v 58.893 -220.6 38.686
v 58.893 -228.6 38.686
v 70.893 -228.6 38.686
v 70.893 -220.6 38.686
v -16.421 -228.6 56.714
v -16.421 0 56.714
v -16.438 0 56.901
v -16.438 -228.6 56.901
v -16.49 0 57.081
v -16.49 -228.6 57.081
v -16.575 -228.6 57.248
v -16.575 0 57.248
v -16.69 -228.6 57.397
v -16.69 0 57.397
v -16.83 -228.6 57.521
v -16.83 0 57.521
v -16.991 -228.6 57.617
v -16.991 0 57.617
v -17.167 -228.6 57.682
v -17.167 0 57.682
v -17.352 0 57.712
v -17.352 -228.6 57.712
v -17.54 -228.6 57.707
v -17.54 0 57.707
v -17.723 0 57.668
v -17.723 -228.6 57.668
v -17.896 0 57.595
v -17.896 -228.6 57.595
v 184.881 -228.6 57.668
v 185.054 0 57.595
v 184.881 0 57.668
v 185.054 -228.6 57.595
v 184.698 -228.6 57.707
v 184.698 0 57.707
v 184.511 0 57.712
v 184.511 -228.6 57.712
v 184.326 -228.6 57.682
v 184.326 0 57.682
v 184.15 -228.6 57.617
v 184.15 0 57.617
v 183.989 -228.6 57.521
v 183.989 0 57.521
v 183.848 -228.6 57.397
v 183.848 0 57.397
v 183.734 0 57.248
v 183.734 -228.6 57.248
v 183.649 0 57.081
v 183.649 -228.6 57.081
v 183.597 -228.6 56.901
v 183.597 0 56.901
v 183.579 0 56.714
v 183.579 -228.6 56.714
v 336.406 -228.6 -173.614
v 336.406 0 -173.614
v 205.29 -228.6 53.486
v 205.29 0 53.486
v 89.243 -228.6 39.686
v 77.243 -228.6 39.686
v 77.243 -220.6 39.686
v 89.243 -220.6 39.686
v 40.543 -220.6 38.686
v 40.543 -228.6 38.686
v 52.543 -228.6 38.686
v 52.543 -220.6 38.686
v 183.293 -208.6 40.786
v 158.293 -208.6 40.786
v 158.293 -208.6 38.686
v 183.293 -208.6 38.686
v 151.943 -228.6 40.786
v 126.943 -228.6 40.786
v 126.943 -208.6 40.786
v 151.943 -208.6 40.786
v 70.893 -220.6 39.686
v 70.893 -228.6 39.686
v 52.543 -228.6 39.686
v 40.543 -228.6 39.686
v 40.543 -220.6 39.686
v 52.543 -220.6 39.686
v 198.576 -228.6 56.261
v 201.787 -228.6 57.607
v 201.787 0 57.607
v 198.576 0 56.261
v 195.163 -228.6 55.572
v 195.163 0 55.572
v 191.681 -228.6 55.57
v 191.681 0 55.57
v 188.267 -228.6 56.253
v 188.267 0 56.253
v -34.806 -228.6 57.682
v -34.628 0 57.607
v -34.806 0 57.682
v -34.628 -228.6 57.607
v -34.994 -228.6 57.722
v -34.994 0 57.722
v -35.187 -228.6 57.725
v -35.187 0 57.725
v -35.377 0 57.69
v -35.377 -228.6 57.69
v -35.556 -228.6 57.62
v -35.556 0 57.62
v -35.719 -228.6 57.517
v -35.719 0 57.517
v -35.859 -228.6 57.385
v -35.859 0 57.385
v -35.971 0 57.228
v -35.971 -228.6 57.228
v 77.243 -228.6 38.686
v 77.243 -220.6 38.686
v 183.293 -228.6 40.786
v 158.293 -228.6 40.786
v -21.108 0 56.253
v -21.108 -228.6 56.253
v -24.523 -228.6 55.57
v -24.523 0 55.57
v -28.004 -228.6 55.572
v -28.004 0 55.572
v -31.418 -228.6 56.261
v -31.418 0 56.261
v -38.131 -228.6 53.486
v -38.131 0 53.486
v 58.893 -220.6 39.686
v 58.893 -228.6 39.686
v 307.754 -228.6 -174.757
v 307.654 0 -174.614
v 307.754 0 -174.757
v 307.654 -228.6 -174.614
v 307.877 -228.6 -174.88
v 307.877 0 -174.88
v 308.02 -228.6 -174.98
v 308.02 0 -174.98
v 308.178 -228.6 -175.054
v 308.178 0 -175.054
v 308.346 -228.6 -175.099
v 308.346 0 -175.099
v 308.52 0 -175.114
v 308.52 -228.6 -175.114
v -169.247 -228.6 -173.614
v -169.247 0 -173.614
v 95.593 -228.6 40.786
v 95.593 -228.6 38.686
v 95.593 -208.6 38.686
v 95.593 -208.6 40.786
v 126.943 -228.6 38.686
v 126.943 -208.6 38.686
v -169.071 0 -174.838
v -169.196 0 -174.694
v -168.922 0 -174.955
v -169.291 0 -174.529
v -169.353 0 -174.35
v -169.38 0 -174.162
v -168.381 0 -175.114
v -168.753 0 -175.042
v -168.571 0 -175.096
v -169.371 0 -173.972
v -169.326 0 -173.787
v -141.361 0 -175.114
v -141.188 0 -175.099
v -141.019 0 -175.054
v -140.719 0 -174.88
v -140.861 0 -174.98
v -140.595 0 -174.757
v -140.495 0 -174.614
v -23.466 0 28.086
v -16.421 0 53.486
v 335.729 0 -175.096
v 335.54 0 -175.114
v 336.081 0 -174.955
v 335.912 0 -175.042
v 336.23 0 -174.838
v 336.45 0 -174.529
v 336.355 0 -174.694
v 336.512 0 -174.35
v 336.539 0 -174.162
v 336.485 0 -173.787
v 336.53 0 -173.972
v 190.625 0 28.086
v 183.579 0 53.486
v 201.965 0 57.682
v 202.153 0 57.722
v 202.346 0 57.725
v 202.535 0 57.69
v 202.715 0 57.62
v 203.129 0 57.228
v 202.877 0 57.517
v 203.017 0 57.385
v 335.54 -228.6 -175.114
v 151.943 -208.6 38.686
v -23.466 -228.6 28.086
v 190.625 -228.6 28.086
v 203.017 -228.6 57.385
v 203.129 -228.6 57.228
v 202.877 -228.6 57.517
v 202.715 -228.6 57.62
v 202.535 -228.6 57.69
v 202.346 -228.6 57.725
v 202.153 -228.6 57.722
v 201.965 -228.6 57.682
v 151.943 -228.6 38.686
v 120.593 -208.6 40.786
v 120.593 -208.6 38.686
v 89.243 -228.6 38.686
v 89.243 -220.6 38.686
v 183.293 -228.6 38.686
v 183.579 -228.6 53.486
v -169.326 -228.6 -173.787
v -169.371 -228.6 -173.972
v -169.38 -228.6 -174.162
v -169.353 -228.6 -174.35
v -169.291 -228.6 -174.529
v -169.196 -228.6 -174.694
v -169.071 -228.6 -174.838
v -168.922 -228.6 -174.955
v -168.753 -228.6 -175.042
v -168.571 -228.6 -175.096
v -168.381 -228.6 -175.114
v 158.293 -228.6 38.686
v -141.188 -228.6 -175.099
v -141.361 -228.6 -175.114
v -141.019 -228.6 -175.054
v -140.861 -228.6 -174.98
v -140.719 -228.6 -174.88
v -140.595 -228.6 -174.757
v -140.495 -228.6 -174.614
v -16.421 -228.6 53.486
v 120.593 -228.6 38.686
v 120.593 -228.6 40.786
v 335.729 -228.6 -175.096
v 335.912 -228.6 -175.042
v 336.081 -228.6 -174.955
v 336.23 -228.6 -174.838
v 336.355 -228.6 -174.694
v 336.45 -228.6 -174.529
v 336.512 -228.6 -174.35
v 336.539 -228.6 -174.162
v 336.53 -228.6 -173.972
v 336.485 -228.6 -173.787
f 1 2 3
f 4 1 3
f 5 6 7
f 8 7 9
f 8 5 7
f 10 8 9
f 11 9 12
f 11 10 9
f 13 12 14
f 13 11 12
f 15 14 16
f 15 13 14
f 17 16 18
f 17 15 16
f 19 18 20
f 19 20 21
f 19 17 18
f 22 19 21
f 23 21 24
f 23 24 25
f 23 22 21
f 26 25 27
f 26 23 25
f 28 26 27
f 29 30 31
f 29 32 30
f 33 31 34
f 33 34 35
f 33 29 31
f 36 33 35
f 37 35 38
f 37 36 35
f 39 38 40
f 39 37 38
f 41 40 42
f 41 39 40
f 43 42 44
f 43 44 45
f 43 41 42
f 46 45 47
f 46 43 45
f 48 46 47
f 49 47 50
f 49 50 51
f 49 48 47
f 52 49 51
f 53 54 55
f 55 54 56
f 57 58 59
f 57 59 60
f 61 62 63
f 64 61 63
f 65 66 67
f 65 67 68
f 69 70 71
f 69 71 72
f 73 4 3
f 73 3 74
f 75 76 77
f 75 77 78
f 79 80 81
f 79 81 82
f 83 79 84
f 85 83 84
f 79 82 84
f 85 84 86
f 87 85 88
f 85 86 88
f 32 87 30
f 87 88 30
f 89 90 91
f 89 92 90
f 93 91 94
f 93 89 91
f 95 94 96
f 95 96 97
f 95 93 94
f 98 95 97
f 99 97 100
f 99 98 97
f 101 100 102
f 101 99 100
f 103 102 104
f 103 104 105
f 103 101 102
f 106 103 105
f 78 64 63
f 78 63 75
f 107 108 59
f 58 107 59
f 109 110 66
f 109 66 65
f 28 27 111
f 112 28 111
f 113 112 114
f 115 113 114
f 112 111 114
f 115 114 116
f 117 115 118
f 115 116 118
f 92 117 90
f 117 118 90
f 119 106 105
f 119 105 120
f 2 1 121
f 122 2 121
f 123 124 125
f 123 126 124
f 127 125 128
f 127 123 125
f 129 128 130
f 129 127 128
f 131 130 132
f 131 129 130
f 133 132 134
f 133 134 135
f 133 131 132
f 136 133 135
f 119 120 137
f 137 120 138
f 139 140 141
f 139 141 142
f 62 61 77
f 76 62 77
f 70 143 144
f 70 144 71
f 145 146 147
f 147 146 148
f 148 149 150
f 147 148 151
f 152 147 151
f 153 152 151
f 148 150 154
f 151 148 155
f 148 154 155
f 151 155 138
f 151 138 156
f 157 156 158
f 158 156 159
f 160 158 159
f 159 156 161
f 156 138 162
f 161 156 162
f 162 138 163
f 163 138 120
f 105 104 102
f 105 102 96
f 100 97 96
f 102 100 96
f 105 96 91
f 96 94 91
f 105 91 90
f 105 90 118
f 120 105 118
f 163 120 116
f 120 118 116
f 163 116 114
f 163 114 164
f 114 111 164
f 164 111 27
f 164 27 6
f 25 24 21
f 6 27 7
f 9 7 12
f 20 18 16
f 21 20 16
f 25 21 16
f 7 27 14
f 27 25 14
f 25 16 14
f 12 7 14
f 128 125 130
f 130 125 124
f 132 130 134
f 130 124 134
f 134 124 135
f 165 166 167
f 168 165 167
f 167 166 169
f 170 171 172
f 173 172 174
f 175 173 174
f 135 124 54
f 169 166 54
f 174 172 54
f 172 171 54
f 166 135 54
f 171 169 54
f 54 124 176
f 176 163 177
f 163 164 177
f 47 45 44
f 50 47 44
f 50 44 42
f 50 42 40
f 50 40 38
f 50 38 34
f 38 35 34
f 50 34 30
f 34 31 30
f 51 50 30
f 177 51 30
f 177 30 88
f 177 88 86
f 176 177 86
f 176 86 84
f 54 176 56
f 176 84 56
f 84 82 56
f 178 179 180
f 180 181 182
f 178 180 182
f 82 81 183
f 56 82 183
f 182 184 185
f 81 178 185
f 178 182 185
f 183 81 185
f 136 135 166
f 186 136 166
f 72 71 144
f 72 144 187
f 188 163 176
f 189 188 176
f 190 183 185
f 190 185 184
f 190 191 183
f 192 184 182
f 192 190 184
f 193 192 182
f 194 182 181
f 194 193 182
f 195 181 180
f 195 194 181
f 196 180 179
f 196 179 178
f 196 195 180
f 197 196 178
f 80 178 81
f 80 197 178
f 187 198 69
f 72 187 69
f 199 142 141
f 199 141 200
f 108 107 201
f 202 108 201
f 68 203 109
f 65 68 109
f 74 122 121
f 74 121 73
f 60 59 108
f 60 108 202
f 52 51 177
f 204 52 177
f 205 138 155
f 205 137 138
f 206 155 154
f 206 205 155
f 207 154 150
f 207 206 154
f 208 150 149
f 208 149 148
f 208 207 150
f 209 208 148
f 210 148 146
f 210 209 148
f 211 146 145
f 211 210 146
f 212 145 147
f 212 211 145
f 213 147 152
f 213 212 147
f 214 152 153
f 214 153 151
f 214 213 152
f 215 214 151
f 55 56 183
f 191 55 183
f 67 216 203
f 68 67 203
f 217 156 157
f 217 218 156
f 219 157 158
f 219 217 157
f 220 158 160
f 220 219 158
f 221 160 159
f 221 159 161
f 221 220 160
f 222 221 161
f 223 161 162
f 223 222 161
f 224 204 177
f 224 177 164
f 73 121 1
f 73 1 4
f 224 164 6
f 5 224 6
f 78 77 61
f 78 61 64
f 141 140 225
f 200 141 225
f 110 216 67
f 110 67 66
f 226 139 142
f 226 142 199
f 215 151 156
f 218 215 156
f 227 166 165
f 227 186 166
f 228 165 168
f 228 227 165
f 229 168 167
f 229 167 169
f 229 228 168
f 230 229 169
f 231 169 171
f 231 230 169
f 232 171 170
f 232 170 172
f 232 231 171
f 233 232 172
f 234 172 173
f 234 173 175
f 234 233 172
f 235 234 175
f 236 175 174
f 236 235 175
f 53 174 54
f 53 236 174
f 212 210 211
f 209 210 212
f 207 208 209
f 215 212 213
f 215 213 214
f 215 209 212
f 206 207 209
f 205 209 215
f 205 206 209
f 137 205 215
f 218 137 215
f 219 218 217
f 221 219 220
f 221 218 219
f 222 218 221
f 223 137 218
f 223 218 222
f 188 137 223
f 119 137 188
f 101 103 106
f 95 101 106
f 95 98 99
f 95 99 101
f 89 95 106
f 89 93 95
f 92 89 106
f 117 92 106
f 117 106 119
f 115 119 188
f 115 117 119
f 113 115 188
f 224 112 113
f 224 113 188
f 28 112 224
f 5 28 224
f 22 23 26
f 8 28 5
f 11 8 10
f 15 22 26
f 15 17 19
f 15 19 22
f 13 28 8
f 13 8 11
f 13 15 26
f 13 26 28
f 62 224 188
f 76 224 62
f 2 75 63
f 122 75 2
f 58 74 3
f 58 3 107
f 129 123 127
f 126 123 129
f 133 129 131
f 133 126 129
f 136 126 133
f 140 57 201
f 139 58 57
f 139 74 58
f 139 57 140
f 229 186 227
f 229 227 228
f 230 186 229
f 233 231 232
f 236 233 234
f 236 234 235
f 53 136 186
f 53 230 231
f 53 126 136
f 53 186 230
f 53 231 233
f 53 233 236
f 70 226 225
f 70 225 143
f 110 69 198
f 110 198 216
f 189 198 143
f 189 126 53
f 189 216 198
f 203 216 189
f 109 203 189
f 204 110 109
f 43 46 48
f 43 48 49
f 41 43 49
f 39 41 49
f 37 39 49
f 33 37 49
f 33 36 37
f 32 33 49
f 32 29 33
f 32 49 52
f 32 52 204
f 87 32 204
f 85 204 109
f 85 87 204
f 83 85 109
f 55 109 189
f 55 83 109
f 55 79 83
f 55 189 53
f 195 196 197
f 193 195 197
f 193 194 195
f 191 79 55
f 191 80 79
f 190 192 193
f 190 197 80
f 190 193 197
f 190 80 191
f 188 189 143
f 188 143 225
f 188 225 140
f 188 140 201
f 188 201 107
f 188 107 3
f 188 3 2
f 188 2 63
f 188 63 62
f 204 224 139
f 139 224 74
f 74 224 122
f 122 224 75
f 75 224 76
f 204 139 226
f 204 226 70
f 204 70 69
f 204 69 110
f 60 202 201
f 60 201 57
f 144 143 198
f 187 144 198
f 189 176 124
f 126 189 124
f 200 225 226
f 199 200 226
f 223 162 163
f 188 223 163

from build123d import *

# Parameters (mm, degrees)
F1_DEPTH = 228.6
F2_R     = 1
F3_W     = 25
F3_H     = 2.1
F4_DEPTH = 20
F5_W     = 12
F5_H     = 1
F6_DEPTH = 8


with BuildPart() as f1:
    # F0 (on Front) → F1 (new body)
    with BuildSketch(Plane.XZ):
        Polygon((183.579294, 53.486018), (83.579294, 53.486018), (-16.420706, 53.486018), (-38.13115, 53.486018), (-170.113422, -175.113982), (-140.784028, -175.113982), (-23.466453, 28.086018), (83.579294, 28.086018), (190.625042, 28.086018), (307.942616, -175.113982), (337.27201, -175.113982), (205.289739, 53.486018), align=None)
        with BuildLine():
            Line((-38.13115, 53.486018), (-16.420706, 53.486018))
            Line((-16.420706, 53.486018), (-16.420706, 58.486018))
            ThreePointArc((-16.420706, 58.486018), (-25.888059, 55.488385), (-35.470706, 58.094042))
            Line((-35.470706, 58.094042), (-38.13115, 53.486018))
        make_face()
        with BuildLine():
            Line((183.579294, 58.486018), (183.579294, 53.486018))
            Line((183.579294, 53.486018), (205.289739, 53.486018))
            Line((205.289739, 53.486018), (202.629294, 58.094042))
            ThreePointArc((202.629294, 58.094042), (193.046647, 55.488385), (183.579294, 58.486018))
        make_face()
    extrude(amount=F1_DEPTH)

    # F2
    f2_edges = [f1.edges().sort_by_distance(p)[0] for p in [
        (-35.470706, -114.3, 58.094042),
        (-16.420706, -114.3, 58.486018),
        (183.579294, -114.3, 58.486018),
        (202.629294, -114.3, 58.094042),
        (-170.113422, -114.3, -175.113982),
        (-140.784028, -114.3, -175.113982),
        (307.942616, -114.3, -175.113982),
        (337.27201, -114.3, -175.113982),
    ]]
    fillet(f2_edges, radius=F2_R)

    # F3 (on face) → F4 (cut)
    with BuildSketch(Plane.XZ.offset(228.6)):
        with Locations((170.792693, 39.736018)):
            Rectangle(F3_W, F3_H)
        with Locations((139.442693, 39.736018)):
            Rectangle(F3_W, F3_H)
        with Locations((108.092693, 39.736018)):
            Rectangle(F3_W, F3_H)
    extrude(amount=-F4_DEPTH, mode=Mode.SUBTRACT)

    # F5 (on face) → F6 (cut)
    with BuildSketch(Plane.XZ.offset(228.6)):
        with Locations((83.242693, 39.186018)):
            Rectangle(F5_W, F5_H)
        with Locations((64.892693, 39.186018)):
            Rectangle(F5_W, F5_H)
        with Locations((46.542693, 39.186018)):
            Rectangle(F5_W, F5_H)
    extrude(amount=-F6_DEPTH, mode=Mode.SUBTRACT)


solid = f1.part
